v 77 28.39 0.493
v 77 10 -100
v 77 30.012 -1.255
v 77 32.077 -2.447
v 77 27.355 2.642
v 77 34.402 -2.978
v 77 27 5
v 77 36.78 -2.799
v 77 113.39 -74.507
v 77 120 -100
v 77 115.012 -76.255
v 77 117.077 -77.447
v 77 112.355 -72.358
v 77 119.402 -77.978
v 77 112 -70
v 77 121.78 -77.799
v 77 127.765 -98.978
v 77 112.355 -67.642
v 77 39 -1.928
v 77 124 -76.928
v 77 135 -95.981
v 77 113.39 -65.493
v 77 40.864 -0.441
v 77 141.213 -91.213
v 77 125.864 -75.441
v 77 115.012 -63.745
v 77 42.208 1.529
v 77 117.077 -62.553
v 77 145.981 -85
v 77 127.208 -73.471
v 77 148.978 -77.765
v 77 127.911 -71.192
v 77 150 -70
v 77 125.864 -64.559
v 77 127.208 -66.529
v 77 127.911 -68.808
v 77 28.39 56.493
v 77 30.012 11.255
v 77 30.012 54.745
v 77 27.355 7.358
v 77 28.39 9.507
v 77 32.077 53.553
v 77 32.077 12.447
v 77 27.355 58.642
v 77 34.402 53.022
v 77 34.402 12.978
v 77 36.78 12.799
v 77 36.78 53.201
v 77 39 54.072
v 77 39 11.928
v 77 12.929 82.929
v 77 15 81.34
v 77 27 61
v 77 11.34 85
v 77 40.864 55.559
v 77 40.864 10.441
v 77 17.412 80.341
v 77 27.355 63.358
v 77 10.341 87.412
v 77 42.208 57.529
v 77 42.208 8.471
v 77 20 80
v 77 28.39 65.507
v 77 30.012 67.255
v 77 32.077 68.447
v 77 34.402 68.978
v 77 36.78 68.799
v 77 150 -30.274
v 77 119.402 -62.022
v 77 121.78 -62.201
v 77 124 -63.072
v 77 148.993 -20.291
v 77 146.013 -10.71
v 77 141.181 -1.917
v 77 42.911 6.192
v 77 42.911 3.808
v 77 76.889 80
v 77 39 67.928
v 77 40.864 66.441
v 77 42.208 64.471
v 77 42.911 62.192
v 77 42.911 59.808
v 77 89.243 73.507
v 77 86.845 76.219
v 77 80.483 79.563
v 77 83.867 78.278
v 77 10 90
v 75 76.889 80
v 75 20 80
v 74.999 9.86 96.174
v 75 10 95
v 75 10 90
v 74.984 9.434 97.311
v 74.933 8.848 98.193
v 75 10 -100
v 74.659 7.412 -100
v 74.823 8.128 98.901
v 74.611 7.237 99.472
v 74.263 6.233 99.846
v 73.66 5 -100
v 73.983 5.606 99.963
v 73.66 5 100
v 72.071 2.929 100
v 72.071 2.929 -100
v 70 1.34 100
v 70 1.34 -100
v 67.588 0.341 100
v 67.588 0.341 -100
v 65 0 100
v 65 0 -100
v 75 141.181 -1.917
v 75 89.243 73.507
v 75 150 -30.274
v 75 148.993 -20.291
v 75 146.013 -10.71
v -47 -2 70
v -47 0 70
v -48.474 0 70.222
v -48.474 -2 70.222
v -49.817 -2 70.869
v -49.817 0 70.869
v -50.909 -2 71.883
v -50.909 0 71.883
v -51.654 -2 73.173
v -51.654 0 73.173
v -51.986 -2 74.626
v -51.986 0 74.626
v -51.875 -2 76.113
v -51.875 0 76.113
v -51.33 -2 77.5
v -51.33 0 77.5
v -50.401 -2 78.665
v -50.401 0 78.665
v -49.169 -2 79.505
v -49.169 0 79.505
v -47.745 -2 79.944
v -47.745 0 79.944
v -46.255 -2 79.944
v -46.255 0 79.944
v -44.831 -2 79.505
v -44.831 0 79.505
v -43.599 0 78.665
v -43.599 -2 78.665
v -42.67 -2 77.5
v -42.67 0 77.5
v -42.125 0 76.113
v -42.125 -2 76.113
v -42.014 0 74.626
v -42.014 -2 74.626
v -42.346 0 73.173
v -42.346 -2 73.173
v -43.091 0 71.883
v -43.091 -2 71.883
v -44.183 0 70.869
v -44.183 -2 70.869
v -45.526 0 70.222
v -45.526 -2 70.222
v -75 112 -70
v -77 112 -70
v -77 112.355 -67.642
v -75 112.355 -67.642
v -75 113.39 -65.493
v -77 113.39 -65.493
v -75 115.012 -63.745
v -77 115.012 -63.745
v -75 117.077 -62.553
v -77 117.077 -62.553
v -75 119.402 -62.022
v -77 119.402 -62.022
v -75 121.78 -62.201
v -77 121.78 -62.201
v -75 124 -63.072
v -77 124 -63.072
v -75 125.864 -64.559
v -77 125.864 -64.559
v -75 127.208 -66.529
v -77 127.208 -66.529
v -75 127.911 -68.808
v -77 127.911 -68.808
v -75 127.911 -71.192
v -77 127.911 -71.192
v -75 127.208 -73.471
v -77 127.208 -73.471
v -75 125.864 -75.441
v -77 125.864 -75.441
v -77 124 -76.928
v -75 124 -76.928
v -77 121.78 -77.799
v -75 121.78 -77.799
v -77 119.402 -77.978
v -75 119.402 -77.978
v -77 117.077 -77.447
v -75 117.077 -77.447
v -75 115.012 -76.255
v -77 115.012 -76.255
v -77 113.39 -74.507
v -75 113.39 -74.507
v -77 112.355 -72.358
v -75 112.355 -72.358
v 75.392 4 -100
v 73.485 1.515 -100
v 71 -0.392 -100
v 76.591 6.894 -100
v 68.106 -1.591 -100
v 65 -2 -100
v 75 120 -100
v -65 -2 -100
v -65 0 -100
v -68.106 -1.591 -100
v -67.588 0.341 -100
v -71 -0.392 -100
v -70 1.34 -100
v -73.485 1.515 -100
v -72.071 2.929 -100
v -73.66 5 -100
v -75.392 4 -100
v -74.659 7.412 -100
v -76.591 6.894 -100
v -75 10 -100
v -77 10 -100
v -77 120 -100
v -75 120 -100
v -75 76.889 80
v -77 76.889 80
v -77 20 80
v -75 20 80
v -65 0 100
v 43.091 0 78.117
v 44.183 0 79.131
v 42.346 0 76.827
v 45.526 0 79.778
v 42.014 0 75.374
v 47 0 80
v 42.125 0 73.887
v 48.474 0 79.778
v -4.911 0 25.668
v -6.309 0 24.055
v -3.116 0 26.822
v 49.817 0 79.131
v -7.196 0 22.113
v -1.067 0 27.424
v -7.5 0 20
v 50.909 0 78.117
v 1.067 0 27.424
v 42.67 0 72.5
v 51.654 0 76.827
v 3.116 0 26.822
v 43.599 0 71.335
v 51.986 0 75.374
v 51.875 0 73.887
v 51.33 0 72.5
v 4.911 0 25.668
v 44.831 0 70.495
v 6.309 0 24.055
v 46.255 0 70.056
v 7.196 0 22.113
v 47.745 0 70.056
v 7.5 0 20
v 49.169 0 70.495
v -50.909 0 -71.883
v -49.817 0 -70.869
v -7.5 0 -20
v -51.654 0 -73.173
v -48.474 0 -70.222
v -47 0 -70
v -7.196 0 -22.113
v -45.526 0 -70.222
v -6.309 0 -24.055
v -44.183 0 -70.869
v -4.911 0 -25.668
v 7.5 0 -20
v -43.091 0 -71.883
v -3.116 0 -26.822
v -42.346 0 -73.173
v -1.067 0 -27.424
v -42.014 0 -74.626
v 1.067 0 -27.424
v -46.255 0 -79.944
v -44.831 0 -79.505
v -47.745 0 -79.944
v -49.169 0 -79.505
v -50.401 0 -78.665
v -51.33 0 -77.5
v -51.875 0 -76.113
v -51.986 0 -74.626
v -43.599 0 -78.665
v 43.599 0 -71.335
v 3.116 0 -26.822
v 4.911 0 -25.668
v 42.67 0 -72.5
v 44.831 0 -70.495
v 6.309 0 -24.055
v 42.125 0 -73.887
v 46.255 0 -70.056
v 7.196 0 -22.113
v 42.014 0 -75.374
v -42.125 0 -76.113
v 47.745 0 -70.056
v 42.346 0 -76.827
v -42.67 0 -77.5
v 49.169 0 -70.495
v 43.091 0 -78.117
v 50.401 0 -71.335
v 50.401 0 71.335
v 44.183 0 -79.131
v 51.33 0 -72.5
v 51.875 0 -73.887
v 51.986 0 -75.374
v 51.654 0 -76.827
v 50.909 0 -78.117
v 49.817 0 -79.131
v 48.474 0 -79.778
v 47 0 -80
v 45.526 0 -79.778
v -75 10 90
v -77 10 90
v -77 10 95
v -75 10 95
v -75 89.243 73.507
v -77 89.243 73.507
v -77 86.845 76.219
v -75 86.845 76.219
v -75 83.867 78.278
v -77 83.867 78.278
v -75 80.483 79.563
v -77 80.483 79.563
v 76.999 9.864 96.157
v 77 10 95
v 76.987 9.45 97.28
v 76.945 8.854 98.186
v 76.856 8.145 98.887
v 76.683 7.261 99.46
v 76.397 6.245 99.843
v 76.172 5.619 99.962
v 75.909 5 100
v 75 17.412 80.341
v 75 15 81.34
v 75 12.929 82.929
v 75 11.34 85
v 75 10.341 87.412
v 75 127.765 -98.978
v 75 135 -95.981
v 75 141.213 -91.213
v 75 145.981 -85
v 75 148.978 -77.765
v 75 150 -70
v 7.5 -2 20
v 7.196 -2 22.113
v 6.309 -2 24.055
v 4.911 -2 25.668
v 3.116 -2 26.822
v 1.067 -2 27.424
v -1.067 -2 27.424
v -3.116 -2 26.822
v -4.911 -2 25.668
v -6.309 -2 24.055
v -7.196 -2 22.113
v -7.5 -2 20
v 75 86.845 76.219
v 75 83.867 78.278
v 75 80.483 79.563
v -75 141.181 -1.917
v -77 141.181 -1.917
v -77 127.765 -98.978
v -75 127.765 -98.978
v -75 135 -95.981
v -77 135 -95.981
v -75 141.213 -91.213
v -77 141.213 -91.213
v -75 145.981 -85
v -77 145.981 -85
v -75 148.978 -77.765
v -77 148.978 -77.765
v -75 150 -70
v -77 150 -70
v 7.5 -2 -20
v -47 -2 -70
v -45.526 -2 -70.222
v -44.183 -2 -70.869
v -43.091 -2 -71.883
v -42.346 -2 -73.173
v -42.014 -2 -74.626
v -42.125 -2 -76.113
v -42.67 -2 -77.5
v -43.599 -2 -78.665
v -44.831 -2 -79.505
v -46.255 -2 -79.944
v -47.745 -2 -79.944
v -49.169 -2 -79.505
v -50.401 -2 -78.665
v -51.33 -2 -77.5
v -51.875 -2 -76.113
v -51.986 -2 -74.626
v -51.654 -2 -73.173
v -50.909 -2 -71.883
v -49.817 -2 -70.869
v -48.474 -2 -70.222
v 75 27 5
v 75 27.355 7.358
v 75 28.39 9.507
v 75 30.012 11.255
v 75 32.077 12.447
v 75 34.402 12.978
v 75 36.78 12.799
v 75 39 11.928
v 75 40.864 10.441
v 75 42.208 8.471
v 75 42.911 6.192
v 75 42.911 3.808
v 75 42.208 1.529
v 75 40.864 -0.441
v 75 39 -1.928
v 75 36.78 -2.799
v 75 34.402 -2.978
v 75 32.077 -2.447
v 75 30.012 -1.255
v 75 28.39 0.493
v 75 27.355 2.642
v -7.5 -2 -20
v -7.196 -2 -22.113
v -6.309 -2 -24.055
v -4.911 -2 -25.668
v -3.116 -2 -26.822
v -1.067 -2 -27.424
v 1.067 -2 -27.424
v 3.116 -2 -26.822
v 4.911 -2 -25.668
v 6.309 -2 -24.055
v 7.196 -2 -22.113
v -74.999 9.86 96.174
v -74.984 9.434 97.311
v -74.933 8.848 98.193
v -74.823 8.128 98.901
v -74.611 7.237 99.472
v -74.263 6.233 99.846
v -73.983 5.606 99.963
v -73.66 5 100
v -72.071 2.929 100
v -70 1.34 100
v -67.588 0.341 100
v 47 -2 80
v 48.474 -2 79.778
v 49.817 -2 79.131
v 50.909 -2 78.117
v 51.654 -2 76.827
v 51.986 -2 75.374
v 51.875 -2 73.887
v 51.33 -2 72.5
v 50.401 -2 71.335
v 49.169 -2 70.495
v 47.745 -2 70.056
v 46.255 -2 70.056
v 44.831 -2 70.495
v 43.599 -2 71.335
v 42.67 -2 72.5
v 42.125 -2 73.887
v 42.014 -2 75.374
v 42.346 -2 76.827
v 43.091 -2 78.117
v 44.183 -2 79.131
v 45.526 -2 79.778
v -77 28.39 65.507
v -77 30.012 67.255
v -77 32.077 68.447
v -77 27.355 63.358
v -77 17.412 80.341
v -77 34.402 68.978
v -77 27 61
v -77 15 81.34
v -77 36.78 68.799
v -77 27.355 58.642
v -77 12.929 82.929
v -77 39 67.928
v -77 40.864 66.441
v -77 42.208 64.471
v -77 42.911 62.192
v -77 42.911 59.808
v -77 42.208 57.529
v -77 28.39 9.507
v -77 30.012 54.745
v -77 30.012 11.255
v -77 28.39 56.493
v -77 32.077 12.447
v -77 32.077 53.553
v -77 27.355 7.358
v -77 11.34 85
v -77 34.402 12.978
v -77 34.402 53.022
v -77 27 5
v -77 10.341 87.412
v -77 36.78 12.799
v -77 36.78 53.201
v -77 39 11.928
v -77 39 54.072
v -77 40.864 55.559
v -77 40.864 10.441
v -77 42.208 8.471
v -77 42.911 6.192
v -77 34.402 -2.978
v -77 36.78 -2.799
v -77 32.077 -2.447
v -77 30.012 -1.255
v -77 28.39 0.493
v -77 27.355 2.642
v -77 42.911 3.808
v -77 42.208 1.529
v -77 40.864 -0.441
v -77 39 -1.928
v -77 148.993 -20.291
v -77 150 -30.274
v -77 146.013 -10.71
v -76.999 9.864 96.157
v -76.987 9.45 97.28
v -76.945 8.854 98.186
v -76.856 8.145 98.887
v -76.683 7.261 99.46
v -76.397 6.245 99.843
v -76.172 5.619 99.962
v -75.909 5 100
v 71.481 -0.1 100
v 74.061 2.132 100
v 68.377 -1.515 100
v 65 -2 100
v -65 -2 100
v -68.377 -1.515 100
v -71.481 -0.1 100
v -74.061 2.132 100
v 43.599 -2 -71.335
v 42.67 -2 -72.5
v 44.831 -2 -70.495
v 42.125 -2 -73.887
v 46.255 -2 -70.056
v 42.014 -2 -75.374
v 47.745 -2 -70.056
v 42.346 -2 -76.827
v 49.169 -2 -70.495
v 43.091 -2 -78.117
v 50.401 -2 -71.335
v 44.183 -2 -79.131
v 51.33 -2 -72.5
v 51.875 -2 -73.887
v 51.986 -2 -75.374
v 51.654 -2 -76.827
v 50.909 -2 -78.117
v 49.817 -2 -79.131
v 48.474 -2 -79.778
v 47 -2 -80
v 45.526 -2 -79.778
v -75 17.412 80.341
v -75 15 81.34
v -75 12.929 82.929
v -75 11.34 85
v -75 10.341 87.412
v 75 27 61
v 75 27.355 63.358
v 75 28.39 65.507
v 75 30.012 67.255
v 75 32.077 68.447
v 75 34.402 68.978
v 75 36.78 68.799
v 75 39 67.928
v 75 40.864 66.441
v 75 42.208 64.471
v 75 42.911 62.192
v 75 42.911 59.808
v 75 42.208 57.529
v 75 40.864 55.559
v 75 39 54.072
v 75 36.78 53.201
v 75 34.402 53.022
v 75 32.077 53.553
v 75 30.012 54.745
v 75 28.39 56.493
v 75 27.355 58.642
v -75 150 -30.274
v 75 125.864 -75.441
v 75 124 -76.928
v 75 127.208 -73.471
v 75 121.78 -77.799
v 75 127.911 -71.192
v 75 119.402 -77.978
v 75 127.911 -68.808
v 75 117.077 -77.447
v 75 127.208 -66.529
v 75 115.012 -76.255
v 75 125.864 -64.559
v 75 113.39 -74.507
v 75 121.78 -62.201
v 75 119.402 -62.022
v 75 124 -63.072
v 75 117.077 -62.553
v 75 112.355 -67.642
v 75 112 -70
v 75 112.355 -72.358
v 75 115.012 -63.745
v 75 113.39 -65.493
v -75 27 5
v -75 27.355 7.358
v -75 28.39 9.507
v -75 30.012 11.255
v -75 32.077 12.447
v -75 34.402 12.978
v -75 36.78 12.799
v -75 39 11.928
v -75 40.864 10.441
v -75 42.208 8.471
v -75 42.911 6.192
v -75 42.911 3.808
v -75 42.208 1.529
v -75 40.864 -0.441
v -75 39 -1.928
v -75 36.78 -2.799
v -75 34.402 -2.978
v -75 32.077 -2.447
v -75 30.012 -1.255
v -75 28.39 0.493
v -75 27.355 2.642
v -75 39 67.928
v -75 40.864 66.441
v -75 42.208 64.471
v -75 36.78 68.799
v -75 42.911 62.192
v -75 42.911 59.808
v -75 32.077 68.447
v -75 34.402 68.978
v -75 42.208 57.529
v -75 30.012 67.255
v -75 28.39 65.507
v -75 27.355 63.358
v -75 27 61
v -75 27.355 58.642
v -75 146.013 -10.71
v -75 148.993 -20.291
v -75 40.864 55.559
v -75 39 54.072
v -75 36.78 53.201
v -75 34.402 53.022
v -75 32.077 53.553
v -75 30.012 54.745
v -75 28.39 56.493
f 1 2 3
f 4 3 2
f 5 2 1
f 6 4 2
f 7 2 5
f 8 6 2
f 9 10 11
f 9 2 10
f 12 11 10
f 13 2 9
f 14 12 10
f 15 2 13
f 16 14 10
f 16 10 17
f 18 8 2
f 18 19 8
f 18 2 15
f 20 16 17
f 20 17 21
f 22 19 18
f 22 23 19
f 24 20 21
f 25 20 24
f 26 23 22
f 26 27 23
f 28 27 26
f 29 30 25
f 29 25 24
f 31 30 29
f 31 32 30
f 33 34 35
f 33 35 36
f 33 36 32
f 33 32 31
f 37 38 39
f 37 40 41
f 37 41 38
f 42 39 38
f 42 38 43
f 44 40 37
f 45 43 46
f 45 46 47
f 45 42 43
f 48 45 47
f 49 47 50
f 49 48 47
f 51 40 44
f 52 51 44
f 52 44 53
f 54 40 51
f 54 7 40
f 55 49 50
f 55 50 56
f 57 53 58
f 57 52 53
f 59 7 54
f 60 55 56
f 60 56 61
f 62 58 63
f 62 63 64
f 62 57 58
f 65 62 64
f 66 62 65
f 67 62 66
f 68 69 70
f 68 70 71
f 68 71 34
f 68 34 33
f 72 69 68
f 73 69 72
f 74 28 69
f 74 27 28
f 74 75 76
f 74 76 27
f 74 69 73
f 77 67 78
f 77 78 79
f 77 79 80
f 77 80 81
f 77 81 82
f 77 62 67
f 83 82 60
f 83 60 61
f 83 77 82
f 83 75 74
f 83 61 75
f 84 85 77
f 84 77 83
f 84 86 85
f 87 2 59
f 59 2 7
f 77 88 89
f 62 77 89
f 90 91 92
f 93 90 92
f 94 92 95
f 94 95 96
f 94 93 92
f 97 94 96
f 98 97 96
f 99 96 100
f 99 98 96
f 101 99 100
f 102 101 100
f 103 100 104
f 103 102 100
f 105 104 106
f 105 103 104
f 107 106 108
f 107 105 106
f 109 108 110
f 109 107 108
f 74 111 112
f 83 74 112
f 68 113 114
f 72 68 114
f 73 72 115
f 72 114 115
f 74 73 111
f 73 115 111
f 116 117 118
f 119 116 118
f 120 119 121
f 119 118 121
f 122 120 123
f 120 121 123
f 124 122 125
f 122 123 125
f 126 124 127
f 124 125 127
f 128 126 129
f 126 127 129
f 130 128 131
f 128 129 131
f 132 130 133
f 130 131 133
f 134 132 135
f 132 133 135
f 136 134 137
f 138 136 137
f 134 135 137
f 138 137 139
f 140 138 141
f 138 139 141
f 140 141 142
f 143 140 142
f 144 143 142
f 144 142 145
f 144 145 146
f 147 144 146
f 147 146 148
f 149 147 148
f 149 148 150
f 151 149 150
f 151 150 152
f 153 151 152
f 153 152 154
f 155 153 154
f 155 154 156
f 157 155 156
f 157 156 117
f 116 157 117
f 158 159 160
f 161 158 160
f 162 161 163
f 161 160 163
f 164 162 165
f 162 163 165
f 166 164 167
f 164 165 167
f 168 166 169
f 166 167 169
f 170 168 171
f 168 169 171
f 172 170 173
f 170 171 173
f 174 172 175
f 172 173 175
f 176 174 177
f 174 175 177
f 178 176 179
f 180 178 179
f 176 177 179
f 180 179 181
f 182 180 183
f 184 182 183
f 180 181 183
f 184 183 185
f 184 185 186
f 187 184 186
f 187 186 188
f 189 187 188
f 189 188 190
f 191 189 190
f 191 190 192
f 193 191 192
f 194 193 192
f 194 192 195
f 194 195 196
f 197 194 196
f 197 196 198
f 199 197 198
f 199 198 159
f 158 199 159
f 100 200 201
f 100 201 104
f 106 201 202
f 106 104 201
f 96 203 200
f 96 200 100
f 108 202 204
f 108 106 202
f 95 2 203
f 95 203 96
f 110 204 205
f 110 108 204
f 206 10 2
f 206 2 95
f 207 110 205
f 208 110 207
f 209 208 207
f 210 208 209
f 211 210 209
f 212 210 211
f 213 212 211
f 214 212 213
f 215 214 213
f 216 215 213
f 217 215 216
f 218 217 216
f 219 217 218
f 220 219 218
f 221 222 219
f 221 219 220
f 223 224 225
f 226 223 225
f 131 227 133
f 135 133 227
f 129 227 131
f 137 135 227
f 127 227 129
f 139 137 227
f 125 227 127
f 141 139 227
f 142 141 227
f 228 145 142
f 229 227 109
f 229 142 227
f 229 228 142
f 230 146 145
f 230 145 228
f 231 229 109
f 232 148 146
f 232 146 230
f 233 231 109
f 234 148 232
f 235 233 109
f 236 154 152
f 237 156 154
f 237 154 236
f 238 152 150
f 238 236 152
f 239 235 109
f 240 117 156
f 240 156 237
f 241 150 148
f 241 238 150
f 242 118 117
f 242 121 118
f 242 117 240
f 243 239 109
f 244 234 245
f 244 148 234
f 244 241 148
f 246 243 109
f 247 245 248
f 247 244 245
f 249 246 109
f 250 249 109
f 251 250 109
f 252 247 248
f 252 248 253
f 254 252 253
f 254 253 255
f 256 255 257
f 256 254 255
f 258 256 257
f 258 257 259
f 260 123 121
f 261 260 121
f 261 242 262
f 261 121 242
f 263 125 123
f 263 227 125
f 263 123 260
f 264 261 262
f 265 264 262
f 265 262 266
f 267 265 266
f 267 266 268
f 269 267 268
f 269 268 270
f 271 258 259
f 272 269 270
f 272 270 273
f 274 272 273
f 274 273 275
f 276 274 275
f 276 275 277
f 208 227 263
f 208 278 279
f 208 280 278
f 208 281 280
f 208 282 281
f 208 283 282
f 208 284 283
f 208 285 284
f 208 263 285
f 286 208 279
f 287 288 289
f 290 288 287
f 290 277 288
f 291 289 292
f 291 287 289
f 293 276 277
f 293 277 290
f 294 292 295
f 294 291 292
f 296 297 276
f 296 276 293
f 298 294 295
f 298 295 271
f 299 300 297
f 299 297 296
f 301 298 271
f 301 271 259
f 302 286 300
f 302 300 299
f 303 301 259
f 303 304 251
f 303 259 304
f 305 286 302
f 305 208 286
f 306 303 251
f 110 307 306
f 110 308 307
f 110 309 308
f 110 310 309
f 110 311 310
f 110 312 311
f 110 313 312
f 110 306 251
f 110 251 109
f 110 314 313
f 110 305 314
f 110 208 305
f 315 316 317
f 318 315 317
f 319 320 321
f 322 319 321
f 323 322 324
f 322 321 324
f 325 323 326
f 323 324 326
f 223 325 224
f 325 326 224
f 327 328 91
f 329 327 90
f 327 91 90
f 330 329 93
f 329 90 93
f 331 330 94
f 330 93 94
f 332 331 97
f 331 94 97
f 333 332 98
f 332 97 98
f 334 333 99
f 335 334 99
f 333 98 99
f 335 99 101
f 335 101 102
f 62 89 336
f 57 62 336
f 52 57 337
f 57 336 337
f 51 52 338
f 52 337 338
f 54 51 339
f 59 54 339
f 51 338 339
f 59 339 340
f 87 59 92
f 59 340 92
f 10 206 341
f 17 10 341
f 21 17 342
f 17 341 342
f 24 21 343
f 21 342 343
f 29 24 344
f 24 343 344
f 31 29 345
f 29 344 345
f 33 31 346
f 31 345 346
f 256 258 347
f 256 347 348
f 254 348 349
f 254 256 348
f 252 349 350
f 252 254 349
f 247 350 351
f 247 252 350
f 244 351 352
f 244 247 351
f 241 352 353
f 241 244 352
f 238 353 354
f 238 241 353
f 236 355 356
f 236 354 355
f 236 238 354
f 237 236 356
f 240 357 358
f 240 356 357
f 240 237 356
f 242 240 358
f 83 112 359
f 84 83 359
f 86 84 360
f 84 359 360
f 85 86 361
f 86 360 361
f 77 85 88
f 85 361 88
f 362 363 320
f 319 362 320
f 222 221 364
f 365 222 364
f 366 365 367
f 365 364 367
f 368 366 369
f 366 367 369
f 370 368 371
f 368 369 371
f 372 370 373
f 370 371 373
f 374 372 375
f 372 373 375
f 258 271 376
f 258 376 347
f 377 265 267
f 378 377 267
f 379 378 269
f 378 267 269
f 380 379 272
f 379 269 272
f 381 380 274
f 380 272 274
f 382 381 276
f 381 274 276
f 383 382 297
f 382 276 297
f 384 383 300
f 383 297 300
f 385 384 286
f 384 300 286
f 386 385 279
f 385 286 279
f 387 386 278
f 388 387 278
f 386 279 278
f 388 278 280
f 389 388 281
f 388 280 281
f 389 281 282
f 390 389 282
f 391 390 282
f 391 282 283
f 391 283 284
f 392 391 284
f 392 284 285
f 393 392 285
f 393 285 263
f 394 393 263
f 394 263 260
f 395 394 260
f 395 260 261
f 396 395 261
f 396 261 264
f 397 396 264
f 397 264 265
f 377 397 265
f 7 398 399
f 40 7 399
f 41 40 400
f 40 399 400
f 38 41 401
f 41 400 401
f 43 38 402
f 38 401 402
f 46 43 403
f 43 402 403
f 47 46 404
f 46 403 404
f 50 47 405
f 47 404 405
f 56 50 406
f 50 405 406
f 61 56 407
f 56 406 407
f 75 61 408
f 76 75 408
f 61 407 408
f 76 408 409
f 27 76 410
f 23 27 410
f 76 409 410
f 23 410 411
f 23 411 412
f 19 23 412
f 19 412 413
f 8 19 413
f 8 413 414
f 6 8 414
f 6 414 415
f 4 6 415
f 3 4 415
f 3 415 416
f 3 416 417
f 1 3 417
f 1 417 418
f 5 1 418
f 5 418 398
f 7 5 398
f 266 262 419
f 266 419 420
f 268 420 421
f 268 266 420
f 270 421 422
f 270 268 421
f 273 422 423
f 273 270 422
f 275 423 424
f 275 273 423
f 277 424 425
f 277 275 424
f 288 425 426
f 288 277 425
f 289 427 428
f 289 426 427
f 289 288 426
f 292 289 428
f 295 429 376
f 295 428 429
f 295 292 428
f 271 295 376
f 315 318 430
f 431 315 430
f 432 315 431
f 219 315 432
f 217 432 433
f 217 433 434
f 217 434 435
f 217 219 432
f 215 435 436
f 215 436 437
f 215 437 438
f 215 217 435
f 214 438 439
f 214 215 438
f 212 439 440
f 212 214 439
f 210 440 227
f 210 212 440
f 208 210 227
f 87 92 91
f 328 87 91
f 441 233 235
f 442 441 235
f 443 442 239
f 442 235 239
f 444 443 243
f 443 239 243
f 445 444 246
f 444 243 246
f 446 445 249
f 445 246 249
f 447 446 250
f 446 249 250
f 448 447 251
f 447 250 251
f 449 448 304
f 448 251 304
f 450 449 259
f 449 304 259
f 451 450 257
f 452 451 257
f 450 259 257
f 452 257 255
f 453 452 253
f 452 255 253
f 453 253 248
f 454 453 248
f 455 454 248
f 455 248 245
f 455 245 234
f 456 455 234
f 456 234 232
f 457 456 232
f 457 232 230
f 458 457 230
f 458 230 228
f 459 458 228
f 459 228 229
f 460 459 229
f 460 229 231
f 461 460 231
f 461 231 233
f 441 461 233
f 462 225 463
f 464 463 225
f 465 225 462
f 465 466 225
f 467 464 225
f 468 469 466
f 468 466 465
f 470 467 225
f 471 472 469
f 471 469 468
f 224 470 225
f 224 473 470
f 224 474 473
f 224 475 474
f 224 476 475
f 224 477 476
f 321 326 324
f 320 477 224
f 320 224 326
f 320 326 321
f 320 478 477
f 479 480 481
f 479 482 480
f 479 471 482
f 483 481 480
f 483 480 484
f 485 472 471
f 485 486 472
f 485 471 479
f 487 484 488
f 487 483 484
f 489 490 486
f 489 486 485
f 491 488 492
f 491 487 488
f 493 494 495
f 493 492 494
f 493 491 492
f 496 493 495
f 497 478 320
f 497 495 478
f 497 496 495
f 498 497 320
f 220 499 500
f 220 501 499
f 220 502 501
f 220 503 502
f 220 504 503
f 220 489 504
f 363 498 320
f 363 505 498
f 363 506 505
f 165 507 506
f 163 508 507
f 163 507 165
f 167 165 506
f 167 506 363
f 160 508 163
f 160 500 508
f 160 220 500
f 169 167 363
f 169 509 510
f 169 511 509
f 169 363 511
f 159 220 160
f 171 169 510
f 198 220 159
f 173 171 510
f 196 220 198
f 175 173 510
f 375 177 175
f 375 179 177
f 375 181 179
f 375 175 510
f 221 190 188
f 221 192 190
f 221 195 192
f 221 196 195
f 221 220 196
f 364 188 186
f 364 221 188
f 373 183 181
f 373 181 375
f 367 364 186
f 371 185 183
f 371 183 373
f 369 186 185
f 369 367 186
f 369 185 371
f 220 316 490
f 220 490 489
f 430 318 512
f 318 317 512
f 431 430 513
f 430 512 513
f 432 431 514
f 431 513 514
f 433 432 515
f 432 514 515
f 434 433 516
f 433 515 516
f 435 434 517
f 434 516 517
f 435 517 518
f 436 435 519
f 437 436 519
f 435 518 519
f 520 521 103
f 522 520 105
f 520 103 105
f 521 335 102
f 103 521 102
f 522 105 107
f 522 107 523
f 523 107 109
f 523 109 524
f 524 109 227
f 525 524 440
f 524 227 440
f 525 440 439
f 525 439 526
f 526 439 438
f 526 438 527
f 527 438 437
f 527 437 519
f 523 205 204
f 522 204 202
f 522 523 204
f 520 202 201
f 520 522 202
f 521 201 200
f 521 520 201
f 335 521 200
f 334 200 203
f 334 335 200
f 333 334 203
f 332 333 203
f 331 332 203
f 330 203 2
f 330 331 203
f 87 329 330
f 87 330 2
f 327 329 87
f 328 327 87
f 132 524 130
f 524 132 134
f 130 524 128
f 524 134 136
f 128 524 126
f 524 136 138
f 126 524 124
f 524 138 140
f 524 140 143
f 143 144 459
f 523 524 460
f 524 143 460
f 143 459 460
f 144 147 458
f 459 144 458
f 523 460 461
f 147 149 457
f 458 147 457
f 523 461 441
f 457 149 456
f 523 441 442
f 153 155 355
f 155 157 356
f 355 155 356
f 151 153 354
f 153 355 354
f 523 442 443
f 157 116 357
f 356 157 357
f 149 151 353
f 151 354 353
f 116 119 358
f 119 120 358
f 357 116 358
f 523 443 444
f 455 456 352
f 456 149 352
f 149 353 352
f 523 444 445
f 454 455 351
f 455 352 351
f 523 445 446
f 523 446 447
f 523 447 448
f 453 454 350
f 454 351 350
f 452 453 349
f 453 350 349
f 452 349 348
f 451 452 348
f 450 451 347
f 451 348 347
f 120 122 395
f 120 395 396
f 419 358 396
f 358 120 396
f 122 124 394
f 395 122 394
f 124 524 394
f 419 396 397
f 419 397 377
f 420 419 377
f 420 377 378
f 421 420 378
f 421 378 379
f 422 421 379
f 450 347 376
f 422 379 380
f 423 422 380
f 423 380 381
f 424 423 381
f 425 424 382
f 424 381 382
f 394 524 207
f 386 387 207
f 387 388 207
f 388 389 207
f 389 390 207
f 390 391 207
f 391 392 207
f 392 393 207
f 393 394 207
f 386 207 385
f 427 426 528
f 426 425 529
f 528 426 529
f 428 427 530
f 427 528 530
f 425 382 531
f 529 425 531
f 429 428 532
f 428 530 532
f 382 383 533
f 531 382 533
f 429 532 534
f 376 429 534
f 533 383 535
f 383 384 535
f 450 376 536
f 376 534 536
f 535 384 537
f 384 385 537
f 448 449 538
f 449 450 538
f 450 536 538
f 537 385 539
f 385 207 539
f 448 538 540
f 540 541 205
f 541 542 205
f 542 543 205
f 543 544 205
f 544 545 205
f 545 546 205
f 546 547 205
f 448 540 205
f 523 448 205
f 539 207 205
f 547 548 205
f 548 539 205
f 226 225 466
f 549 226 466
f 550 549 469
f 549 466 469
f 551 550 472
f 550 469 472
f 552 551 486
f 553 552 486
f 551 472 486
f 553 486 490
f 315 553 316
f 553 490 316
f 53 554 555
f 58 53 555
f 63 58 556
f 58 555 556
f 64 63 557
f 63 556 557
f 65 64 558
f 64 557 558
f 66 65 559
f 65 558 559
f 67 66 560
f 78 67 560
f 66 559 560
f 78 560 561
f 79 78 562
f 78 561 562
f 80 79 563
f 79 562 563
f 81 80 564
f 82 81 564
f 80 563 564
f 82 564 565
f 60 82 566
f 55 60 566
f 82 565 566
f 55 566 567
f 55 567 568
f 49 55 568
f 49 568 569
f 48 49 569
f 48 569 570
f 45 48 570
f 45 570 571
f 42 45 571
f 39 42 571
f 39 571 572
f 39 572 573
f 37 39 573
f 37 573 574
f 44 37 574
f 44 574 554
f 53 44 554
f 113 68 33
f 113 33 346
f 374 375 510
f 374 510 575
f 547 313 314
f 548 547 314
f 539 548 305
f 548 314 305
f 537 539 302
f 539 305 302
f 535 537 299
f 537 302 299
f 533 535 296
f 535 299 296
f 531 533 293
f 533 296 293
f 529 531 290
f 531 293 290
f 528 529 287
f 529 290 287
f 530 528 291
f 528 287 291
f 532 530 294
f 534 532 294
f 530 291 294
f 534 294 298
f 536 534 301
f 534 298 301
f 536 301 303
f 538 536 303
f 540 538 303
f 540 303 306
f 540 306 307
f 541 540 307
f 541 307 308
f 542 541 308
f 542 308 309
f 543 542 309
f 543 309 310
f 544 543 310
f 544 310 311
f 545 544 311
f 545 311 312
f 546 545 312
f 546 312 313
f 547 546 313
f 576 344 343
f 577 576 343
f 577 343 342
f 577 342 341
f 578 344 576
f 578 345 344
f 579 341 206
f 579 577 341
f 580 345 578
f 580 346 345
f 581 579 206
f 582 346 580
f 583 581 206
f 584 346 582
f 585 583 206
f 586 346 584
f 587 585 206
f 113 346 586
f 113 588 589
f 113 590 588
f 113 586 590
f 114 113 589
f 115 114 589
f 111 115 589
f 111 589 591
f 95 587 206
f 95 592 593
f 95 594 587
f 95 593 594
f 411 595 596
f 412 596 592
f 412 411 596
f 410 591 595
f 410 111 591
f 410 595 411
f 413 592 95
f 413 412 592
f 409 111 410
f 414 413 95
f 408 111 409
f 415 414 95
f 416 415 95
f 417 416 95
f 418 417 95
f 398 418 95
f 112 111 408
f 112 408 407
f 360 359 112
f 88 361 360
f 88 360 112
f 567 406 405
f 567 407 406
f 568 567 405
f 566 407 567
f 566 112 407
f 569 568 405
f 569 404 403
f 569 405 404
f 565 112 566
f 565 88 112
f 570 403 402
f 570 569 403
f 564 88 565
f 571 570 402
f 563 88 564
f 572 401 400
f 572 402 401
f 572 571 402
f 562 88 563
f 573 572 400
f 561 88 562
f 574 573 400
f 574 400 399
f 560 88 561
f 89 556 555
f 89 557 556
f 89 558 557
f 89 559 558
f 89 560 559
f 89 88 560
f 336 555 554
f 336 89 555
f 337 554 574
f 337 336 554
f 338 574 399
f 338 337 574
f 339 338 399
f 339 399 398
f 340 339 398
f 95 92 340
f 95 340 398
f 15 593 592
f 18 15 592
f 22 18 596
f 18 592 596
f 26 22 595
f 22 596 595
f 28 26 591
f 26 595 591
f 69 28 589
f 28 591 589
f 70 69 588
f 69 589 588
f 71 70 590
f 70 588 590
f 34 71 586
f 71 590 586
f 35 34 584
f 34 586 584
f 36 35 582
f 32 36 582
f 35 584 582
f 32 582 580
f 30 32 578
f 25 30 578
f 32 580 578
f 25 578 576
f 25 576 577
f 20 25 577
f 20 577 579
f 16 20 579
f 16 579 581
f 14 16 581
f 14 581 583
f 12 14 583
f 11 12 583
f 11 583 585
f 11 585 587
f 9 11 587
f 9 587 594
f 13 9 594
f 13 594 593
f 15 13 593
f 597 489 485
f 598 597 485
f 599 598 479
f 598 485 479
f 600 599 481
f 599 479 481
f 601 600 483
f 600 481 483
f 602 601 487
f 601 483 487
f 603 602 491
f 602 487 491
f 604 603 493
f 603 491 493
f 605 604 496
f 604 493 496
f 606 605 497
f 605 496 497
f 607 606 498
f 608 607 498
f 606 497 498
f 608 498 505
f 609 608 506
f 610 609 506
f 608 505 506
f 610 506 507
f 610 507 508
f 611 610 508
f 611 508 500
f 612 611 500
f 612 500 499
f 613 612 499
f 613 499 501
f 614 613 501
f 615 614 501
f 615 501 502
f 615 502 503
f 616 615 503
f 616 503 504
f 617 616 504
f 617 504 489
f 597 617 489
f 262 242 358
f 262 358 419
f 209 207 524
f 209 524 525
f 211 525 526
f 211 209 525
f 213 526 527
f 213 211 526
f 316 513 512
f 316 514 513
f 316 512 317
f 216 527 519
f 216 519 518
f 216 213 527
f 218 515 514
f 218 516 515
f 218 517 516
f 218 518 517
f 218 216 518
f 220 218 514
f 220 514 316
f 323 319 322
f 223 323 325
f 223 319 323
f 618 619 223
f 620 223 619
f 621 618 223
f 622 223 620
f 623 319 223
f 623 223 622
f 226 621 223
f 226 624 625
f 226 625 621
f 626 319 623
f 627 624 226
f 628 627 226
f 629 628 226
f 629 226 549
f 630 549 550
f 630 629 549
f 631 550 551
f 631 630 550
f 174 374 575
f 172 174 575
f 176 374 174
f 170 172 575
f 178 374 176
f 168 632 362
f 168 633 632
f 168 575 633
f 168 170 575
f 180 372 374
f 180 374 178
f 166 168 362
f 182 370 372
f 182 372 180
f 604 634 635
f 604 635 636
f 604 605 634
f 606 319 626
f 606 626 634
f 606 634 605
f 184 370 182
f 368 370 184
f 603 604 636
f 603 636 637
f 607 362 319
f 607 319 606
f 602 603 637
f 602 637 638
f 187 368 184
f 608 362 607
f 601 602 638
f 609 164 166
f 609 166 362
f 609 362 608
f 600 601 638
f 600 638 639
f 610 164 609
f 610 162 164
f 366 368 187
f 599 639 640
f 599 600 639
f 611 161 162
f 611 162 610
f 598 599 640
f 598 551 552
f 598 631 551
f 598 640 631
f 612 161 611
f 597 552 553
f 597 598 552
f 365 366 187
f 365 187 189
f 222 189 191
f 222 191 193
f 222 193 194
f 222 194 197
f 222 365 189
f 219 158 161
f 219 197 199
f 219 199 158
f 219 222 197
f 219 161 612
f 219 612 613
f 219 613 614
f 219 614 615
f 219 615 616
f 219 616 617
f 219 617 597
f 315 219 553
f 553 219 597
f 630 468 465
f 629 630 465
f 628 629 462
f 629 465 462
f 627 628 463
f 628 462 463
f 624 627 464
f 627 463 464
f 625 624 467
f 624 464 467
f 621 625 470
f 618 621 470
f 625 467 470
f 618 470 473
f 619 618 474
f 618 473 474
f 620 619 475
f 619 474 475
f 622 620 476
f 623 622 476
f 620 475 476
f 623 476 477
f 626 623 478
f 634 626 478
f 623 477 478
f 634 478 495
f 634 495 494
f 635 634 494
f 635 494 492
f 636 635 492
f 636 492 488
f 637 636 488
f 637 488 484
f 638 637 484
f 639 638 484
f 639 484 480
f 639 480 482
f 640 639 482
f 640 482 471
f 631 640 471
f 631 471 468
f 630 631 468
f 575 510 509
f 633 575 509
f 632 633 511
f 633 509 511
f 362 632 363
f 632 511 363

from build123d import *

# Parameters (mm, degrees)
SKETCH1_W                      = 150
SKETCH1_H                      = 200
BASE_FLANGE1_DEPTH             = 2
EDGE_FLANGE1_STRIP_W           = 28
EDGE_FLANGE1_STRIP_H           = 2
EDGE_FLANGE1_STRIP_CUT_DEPTH   = 200
EDGE_FLANGE1_STRIP_2_W         = 28
EDGE_FLANGE1_STRIP_2_H         = 2
EDGE_FLANGE1_STRIP_CUT_2_DEPTH = 200
EDGE_FLANGE1_DEPTH             = 200
EDGE_FLANGE1_BEND_DEPTH        = 200
SKETCH15_OUTSIDE_W             = 260.93
SKETCH15_OUTSIDE_H             = 212.93
SKETCH15_OUTSIDE_R             = 8
CUT_EXTRUDE1_DEPTH             = 238.099135384
SKETCH16_R                     = 5
CUT_EXTRUDE2_DEPTH             = 197.033160551


# Sheet-metal steps are written as plain solids
with BuildPart() as part:
    # Sketch1 → Base-Flange1 (new body)
    with BuildSketch(Plane(origin=(0, 0, 0), x_dir=(1, 0, 0), z_dir=(0, 1, 0))):
        Rectangle(SKETCH1_W, SKETCH1_H)
    extrude(amount=-BASE_FLANGE1_DEPTH)

    # Edge-Flange1 strip (across the edge) → Edge-Flange1 strip cut (cut)
    with BuildSketch(Plane(origin=(75, 0, 100), x_dir=(-1, 0, 0), z_dir=(0, 0, -1))):
        with Locations((-4, -1)):
            Rectangle(EDGE_FLANGE1_STRIP_W, EDGE_FLANGE1_STRIP_H)
    extrude(amount=EDGE_FLANGE1_STRIP_CUT_DEPTH, mode=Mode.SUBTRACT)

    # Edge-Flange1 strip 2 (across the edge) → Edge-Flange1 strip cut 2 (cut)
    with BuildSketch(Plane(origin=(-75, 0, -100), x_dir=(1, 0, 0), z_dir=(0, 0, 1))):
        with Locations((-4, -1)):
            Rectangle(EDGE_FLANGE1_STRIP_2_W, EDGE_FLANGE1_STRIP_2_H)
    extrude(amount=EDGE_FLANGE1_STRIP_CUT_2_DEPTH, mode=Mode.SUBTRACT)

    # Edge-Flange1 section (across the edge) → Edge-Flange1 (add)
    with BuildSketch(Plane(origin=(75, 0, 100), x_dir=(-1, 0, 0), z_dir=(0, 0, -1))):
        with BuildLine():
            Line((-2, 10), (-2, 150))
            Line((-2, 150), (0, 150))
            Line((0, 150), (0, 10))
            ThreePointArc((0, 10), (2.928932188, 2.928932188), (10, 0))
            Line((10, 0), (10, -2))
            ThreePointArc((10, -2), (1.514718626, 1.514718626), (-2, 10))
        make_face()
    extrude(amount=EDGE_FLANGE1_DEPTH)

    # Edge-Flange1 section 2 (across the edge) → Edge-Flange1 bend (add)
    with BuildSketch(Plane(origin=(-75, 0, -100), x_dir=(1, 0, 0), z_dir=(0, 0, 1))):
        with BuildLine():
            Line((-2, 10), (-2, 150))
            Line((-2, 150), (0, 150))
            Line((0, 150), (0, 10))
            ThreePointArc((0, 10), (2.928932188, 2.928932188), (10, 0))
            Line((10, 0), (10, -2))
            ThreePointArc((10, -2), (1.514718626, 1.514718626), (-2, 10))
        make_face()
    extrude(amount=EDGE_FLANGE1_BEND_DEPTH)

    # Sketch15 outside → Cut-Extrude1 (cut, through all)
    # profile 1 of 4: a face of its own
    with BuildSketch(Plane.ZY.offset(77)):
        with Locations((0, 74)):
            Rectangle(SKETCH15_OUTSIDE_W, SKETCH15_OUTSIDE_H)
        with BuildLine():
            Line((-1.916529607, 141.180744276), (73.507242037, 89.243178795))
            ThreePointArc((73.507242037, 89.243178795), (78.277963521, 83.867184852), (80, 76.888955512))
            Line((80, 76.888955512), (80, 20))
            ThreePointArc((80, 20), (82.928932188, 12.928932188), (90, 10))
            Line((90, 10), (95, 10))
            ThreePointArc((95, 10), (98.535533906, 8.535533906), (100, 5))
            Line((100, 5), (100, -2))
            Line((100, -2), (-100, -2))
            Line((-100, -2), (-100, 99))
            Line((-100, 99), (-100, 120))
            ThreePointArc((-100, 120), (-91.213203436, 141.213203436), (-70, 150))
            Line((-70, 150), (-49, 150))
            Line((-49, 150), (-30.274003064, 150))
            ThreePointArc((-30.274003064, 150), (-15.425387199, 147.744304445), (-1.916529607, 141.180744276))
        make_face(mode=Mode.SUBTRACT)
    # profile 2 of 4: a face of its own
    with BuildSketch(Plane.ZY.offset(77)):
        with Locations(Location((61, 35, 0), (0, 0, 270))):
            Circle(SKETCH15_OUTSIDE_R)
    # profile 3 of 4: a face of its own
    with BuildSketch(Plane.ZY.offset(77)):
        with Locations(Location((-70, 120, 0), (0, 0, 270))):
            Circle(SKETCH15_OUTSIDE_R)
    # profile 4 of 4: a face of its own
    with BuildSketch(Plane.ZY.offset(77)):
        with Locations(Location((5, 35, 0), (0, 0, 270))):
            Circle(SKETCH15_OUTSIDE_R)
    extrude(amount=-CUT_EXTRUDE1_DEPTH, mode=Mode.SUBTRACT)

    # Sketch16 → Cut-Extrude2 (cut, through all)
    with BuildSketch(Plane(origin=(0, 0, 0), x_dir=(1, 0, 0), z_dir=(0, 1, 0))):
        with Locations(Location((-47, 75, 0), (0, 0, 270))):
            Circle(SKETCH16_R)
        with Locations(Location((47, 75, 0), (0, 0, 90))):
            Circle(SKETCH16_R)
        with Locations(Location((47, -75, 0), (0, 0, 270))):
            Circle(SKETCH16_R)
        with Locations(Location((-47, -75, 0), (0, 0, 90))):
            Circle(SKETCH16_R)
        with BuildLine():
            Line((7.5, 20), (7.5, -20))
            ThreePointArc((7.5, -20), (0, -27.5), (-7.5, -20))
            Line((-7.5, -20), (-7.5, 20))
            ThreePointArc((-7.5, 20), (0, 27.5), (7.5, 20))
        make_face()
    extrude(amount=-CUT_EXTRUDE2_DEPTH, mode=Mode.SUBTRACT)


solid = part.part
